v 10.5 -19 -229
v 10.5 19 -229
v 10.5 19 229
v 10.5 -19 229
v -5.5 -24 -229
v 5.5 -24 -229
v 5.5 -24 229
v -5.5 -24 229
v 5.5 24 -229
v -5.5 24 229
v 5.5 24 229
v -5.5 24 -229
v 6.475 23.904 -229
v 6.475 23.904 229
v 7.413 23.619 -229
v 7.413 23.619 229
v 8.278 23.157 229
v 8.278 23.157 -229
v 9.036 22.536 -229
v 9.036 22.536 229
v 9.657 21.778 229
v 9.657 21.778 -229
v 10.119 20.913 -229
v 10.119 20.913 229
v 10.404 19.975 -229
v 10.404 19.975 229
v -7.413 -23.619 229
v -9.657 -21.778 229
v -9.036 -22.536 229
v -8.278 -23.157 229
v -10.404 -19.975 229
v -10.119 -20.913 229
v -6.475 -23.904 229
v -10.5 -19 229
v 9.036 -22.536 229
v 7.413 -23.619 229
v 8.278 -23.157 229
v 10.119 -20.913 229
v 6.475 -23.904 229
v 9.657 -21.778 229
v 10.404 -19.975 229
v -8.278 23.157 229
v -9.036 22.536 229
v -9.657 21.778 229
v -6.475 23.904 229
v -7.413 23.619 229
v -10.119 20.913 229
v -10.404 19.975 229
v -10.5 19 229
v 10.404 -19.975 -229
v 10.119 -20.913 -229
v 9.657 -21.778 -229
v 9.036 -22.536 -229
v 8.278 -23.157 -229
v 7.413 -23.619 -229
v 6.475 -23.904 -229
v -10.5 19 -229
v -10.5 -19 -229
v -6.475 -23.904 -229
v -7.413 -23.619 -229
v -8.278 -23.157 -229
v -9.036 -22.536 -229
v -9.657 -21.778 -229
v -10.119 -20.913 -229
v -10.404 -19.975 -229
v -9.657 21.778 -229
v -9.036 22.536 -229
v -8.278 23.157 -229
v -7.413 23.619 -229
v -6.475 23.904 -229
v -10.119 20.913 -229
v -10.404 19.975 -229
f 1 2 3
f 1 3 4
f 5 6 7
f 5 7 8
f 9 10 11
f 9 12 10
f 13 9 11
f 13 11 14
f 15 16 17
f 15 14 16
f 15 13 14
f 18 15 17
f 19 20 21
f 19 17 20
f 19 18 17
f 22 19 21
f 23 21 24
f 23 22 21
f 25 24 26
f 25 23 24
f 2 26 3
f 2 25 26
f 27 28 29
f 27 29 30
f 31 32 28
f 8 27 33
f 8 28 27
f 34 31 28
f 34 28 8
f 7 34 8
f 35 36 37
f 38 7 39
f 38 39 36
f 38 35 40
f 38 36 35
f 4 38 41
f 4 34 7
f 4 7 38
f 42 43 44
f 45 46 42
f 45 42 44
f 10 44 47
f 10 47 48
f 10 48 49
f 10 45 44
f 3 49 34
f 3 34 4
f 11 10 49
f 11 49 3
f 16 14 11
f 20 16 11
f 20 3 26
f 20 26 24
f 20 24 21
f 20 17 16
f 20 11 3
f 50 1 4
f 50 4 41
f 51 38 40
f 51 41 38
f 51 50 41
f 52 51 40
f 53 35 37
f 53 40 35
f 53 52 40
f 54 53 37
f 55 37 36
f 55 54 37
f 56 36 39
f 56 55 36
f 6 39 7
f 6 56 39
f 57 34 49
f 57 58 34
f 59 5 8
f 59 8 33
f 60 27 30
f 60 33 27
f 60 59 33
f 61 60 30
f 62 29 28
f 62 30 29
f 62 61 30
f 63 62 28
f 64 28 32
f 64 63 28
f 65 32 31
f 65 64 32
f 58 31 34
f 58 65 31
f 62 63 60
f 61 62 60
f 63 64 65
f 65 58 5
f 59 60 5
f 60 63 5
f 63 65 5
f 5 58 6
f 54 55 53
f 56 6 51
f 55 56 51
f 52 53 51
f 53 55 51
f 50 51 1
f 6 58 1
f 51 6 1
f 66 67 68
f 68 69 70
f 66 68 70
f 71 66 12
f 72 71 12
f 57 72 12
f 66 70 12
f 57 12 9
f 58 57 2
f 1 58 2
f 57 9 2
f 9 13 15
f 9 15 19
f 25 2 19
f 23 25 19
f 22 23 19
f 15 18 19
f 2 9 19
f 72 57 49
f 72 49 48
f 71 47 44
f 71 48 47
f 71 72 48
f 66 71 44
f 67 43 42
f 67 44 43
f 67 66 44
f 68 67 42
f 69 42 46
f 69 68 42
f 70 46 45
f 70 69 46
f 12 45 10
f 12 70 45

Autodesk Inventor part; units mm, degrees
ref_plane "YZ Plane" through (0, 0, 0) normal (1, 0, 0) x (0, 1, 0)
ref_plane "XZ Plane" through (0, 0, 0) normal (0, 1, 0) x (-1, 0, 0)
ref_plane "XY Plane" through (0, 0, 0) normal (0, 0, 1) x (1, 0, 0)
sketch "Esboço1" plane through (0, 0, 0) normal (0, 0, 1) x (1, 0, 0)
  line L0 (-5.5, 24) -> (5.5, 24)
  line L1 (10.5, 19) -> (10.5, -19)
  line L2 (5.5, -24) -> (-5.5, -24)
  line L3 (-10.5, -19) -> (-10.5, 19)
  line L4 (-10.5, 24) -> (10.5, -24) construction
  line L5 (10.5, 24) -> (-10.5, -24) construction
  arc A0 (-5.5, 24) -> (-10.5, 19) centre (-5.5, 19) ccw
  arc A1 (10.5, 19) -> (5.5, 24) centre (5.5, 19) ccw
  arc A2 (5.5, -24) -> (10.5, -19) centre (5.5, -19) ccw
  arc A3 (-10.5, -19) -> (-5.5, -24) centre (-5.5, -19) ccw
  point P0 (0, 0)
  dimension "d0" = 21
  dimension "d1" = 48
  dimension "d2" = 5
extrude "Extrusão1" add sketch "Esboço1" along normal mid plane 458
properties part number "Ripas - Base - 458 mm"
